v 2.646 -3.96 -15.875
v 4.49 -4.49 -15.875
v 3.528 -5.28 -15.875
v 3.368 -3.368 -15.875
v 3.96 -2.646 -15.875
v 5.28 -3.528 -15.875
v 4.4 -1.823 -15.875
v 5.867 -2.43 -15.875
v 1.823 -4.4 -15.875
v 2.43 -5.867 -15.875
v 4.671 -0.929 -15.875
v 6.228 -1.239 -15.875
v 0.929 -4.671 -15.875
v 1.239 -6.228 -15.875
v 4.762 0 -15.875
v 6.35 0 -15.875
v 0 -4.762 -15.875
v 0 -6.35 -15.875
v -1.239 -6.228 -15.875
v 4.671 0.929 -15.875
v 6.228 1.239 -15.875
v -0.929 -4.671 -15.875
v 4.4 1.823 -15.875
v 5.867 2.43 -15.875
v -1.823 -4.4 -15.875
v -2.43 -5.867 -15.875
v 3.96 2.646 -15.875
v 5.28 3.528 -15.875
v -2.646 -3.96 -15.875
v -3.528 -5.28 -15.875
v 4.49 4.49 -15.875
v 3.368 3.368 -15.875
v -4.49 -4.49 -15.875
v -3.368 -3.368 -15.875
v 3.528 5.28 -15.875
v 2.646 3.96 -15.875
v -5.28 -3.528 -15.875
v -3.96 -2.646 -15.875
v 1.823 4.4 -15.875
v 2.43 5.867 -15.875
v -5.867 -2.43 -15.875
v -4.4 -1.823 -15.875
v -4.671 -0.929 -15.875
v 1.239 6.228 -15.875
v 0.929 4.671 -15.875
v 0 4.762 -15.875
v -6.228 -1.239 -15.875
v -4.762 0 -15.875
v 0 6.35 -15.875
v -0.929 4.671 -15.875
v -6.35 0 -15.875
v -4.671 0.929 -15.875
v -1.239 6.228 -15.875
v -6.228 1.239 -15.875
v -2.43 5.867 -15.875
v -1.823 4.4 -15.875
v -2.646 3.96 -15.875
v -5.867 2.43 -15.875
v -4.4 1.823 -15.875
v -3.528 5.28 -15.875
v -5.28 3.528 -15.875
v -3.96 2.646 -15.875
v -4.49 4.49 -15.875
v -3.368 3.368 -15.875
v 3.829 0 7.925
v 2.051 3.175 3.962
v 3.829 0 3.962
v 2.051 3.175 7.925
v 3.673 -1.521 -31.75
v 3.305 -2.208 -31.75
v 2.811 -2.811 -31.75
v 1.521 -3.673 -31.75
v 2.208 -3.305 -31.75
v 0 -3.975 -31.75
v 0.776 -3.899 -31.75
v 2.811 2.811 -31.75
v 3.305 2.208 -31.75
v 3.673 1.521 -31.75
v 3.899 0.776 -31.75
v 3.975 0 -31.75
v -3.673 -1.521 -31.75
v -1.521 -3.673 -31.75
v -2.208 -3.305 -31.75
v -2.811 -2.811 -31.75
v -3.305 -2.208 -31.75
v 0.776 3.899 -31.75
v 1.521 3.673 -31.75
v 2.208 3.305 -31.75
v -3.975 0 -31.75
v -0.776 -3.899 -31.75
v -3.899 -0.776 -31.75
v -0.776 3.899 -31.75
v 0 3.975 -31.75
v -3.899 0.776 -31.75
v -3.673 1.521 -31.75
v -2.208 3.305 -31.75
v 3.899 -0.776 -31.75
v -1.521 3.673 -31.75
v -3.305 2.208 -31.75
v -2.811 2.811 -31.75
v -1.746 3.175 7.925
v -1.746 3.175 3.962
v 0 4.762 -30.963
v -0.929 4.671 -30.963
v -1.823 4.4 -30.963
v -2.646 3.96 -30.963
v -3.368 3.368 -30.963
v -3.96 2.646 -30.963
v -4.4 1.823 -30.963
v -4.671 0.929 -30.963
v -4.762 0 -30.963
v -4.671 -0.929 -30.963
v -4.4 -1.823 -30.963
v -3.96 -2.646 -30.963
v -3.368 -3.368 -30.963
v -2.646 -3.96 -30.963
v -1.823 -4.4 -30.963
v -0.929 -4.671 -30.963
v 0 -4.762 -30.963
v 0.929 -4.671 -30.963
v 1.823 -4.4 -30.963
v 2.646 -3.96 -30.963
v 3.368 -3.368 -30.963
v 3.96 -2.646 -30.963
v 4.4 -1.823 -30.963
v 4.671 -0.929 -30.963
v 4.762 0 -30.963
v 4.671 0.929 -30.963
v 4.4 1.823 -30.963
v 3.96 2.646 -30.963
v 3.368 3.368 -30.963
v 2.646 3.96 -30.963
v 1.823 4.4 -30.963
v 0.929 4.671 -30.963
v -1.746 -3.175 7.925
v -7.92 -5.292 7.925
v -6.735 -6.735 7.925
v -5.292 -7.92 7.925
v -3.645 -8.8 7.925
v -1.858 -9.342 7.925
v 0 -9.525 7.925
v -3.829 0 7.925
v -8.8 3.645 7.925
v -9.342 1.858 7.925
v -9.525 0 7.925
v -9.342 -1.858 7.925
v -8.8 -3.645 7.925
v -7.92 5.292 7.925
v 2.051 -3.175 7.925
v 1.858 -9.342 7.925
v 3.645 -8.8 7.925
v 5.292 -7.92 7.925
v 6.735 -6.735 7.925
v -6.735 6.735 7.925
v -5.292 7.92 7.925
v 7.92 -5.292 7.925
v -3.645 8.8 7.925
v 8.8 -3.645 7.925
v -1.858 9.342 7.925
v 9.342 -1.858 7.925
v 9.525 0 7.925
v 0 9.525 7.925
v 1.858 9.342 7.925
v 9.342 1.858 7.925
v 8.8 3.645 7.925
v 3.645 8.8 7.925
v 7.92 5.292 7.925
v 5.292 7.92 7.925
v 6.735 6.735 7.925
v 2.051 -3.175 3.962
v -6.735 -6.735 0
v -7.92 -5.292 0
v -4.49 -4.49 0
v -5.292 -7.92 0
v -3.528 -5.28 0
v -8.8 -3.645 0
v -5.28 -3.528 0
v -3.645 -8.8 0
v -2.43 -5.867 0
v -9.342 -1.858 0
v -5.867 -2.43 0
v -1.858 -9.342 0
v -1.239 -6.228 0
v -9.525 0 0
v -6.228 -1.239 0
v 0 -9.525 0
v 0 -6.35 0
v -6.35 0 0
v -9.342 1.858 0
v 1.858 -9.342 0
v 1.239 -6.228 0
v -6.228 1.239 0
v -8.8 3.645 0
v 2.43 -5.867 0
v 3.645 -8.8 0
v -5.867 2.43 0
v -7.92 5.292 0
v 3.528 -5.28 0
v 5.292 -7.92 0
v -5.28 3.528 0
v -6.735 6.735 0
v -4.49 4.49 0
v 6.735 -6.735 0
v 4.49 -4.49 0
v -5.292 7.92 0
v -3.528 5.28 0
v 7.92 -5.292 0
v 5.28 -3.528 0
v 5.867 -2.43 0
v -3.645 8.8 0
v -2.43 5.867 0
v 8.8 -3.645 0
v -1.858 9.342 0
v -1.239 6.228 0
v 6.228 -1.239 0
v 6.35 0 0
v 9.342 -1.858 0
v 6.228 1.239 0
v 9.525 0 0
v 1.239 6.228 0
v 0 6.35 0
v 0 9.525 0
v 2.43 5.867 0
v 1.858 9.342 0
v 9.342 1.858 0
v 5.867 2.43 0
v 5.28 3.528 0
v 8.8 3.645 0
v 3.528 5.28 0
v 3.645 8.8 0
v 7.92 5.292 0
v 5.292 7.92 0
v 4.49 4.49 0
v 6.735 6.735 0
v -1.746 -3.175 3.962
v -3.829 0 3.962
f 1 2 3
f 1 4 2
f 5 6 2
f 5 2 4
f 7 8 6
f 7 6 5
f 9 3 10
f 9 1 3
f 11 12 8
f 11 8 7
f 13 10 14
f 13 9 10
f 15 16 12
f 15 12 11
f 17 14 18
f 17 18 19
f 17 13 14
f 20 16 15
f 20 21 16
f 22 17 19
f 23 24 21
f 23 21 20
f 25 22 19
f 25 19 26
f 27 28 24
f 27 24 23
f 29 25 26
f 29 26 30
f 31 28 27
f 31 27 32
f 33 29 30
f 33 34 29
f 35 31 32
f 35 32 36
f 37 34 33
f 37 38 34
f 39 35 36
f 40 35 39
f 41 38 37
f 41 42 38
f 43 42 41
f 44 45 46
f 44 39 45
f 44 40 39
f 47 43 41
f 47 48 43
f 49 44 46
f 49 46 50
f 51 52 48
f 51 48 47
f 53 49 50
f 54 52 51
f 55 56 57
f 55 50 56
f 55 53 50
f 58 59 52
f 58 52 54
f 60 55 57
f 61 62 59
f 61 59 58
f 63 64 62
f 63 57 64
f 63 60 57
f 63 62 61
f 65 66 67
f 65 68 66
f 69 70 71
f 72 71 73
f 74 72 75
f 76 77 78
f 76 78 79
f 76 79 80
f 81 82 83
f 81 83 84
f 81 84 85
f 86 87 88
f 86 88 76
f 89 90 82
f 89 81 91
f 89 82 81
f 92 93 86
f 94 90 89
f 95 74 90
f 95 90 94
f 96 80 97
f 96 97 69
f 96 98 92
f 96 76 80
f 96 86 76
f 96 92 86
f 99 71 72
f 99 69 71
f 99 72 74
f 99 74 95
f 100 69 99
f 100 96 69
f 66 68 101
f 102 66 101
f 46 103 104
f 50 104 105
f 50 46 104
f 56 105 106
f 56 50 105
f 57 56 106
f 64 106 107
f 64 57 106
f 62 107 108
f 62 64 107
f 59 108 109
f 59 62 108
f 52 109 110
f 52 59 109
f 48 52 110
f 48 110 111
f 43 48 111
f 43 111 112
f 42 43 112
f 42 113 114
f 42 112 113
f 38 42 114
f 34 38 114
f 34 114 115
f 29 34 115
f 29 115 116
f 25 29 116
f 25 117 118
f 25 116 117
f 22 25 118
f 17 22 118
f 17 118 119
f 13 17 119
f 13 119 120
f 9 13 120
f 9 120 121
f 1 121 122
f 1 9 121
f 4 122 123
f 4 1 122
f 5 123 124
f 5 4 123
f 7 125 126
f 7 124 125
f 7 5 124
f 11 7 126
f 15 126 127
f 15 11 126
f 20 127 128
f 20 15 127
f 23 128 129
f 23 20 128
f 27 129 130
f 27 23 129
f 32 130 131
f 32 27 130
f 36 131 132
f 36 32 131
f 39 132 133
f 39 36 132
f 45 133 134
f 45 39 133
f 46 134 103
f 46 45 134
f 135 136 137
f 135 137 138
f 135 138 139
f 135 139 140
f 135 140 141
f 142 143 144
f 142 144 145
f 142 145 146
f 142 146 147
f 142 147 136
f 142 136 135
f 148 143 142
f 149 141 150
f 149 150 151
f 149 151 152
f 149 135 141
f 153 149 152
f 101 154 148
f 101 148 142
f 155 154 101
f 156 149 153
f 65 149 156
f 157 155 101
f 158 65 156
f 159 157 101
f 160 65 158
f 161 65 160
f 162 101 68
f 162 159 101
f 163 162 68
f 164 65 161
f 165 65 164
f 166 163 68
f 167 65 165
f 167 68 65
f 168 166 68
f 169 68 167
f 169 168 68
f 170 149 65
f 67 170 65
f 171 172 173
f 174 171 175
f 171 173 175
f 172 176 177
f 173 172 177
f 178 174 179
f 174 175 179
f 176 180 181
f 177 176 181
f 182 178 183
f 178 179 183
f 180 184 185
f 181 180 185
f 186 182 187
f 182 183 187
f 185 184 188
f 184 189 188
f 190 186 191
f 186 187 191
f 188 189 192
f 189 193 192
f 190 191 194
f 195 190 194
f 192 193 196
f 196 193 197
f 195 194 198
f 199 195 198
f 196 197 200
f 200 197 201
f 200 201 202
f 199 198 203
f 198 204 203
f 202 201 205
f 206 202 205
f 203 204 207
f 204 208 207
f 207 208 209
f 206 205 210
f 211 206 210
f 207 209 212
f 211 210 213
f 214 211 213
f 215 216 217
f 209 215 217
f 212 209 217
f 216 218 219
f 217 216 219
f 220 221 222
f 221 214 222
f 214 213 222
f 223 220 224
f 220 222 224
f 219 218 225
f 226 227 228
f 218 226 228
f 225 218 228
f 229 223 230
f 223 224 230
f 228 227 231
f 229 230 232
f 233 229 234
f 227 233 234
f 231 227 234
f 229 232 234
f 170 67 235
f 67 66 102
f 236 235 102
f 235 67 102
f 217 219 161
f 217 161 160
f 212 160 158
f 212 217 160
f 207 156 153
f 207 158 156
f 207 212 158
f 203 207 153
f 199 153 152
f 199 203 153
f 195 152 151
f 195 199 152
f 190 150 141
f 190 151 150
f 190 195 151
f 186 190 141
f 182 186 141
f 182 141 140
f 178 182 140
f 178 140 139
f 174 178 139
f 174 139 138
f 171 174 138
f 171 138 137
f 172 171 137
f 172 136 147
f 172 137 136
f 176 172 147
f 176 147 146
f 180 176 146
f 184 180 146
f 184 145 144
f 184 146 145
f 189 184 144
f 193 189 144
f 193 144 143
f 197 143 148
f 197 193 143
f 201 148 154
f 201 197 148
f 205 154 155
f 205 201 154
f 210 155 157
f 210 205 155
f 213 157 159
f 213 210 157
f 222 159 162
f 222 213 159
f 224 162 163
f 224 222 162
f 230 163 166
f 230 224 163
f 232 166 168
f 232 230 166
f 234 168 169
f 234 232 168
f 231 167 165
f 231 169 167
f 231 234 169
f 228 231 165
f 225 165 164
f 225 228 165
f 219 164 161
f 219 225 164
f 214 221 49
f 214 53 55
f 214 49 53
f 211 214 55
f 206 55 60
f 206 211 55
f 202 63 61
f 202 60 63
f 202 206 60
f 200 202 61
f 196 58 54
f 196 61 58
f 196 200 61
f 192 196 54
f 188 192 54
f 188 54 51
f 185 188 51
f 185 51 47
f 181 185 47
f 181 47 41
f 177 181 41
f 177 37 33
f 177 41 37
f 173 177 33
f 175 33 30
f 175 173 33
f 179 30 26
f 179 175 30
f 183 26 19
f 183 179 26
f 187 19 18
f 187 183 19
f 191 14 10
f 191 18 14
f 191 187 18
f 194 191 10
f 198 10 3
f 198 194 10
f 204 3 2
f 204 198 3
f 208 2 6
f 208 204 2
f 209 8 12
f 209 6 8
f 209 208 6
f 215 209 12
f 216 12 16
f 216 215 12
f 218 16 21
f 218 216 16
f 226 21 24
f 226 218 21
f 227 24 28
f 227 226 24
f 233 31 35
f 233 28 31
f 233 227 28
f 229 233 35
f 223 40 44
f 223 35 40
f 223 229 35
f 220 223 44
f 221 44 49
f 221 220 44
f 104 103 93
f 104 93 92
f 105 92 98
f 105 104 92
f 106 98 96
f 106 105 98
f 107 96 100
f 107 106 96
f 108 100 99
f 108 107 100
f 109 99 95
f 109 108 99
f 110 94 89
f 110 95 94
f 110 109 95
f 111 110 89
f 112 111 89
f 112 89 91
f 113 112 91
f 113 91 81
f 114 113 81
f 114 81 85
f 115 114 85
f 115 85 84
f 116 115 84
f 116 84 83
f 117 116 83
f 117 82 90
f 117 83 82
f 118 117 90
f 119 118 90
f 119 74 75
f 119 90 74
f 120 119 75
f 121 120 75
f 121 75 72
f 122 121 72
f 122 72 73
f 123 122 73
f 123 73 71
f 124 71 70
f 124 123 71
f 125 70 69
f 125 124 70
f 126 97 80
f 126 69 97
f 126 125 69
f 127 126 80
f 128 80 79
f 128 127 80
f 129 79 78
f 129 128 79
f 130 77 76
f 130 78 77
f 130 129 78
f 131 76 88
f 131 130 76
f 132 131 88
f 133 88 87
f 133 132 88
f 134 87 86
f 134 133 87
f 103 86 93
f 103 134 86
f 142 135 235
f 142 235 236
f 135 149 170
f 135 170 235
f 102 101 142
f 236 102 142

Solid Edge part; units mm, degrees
sketch "Sketch1" plane through (0, 0, 0) normal (0, 0, 1) x (1, 0, 0)
  circle A0 centre (0, 0) radius 9.525
  dimension "D1" = 19.05
extrude "Protrusion1" add sketch "Sketch1" along normal blind 7.9248
sketch "Sketch2" plane through (0, 0, 0) normal (0, 0, -1) x (0, 1, 0)
  circle A0 centre (0, 0) radius 6.35
  dimension "D1" = 12.7
extrude "Protrusion2" add sketch "Sketch2" along normal blind 15.875
sketch "Sketch3" plane through (0, 0, -15.875) normal (0, 0, -1) x (0, 1, 0)
  circle A0 centre (0, 0) radius 4.7625
  dimension "D1" = 9.525
extrude "Protrusion3" add sketch "Sketch3" along normal blind 15.875
sketch "Sketch4" plane through (0, 0, 7.9248) normal (0, 0, 1) x (0, 1, 0)
  line L0 (-3.175, 1.7461) -> (0, 3.8287)
  line L1 (-3.175, -2.051) -> (-3.175, 1.7461)
  line L2 (-3.175, -2.051) -> (0, -3.8287)
  line L3 (3.175, -2.051) -> (0, -3.8287)
  line L4 (3.175, -2.051) -> (3.175, 1.7461)
  line L5 (3.175, 1.7461) -> (0, 3.8287)
  dimension "D1" = 6.35
extrude "Cutout1" cut sketch "Sketch4" against normal blind 3.9624
chamfer "Chamfer1" distance 0.7874 angle 45 1 edges at (0, -4.7625, -31.75)
properties part number "192405"
